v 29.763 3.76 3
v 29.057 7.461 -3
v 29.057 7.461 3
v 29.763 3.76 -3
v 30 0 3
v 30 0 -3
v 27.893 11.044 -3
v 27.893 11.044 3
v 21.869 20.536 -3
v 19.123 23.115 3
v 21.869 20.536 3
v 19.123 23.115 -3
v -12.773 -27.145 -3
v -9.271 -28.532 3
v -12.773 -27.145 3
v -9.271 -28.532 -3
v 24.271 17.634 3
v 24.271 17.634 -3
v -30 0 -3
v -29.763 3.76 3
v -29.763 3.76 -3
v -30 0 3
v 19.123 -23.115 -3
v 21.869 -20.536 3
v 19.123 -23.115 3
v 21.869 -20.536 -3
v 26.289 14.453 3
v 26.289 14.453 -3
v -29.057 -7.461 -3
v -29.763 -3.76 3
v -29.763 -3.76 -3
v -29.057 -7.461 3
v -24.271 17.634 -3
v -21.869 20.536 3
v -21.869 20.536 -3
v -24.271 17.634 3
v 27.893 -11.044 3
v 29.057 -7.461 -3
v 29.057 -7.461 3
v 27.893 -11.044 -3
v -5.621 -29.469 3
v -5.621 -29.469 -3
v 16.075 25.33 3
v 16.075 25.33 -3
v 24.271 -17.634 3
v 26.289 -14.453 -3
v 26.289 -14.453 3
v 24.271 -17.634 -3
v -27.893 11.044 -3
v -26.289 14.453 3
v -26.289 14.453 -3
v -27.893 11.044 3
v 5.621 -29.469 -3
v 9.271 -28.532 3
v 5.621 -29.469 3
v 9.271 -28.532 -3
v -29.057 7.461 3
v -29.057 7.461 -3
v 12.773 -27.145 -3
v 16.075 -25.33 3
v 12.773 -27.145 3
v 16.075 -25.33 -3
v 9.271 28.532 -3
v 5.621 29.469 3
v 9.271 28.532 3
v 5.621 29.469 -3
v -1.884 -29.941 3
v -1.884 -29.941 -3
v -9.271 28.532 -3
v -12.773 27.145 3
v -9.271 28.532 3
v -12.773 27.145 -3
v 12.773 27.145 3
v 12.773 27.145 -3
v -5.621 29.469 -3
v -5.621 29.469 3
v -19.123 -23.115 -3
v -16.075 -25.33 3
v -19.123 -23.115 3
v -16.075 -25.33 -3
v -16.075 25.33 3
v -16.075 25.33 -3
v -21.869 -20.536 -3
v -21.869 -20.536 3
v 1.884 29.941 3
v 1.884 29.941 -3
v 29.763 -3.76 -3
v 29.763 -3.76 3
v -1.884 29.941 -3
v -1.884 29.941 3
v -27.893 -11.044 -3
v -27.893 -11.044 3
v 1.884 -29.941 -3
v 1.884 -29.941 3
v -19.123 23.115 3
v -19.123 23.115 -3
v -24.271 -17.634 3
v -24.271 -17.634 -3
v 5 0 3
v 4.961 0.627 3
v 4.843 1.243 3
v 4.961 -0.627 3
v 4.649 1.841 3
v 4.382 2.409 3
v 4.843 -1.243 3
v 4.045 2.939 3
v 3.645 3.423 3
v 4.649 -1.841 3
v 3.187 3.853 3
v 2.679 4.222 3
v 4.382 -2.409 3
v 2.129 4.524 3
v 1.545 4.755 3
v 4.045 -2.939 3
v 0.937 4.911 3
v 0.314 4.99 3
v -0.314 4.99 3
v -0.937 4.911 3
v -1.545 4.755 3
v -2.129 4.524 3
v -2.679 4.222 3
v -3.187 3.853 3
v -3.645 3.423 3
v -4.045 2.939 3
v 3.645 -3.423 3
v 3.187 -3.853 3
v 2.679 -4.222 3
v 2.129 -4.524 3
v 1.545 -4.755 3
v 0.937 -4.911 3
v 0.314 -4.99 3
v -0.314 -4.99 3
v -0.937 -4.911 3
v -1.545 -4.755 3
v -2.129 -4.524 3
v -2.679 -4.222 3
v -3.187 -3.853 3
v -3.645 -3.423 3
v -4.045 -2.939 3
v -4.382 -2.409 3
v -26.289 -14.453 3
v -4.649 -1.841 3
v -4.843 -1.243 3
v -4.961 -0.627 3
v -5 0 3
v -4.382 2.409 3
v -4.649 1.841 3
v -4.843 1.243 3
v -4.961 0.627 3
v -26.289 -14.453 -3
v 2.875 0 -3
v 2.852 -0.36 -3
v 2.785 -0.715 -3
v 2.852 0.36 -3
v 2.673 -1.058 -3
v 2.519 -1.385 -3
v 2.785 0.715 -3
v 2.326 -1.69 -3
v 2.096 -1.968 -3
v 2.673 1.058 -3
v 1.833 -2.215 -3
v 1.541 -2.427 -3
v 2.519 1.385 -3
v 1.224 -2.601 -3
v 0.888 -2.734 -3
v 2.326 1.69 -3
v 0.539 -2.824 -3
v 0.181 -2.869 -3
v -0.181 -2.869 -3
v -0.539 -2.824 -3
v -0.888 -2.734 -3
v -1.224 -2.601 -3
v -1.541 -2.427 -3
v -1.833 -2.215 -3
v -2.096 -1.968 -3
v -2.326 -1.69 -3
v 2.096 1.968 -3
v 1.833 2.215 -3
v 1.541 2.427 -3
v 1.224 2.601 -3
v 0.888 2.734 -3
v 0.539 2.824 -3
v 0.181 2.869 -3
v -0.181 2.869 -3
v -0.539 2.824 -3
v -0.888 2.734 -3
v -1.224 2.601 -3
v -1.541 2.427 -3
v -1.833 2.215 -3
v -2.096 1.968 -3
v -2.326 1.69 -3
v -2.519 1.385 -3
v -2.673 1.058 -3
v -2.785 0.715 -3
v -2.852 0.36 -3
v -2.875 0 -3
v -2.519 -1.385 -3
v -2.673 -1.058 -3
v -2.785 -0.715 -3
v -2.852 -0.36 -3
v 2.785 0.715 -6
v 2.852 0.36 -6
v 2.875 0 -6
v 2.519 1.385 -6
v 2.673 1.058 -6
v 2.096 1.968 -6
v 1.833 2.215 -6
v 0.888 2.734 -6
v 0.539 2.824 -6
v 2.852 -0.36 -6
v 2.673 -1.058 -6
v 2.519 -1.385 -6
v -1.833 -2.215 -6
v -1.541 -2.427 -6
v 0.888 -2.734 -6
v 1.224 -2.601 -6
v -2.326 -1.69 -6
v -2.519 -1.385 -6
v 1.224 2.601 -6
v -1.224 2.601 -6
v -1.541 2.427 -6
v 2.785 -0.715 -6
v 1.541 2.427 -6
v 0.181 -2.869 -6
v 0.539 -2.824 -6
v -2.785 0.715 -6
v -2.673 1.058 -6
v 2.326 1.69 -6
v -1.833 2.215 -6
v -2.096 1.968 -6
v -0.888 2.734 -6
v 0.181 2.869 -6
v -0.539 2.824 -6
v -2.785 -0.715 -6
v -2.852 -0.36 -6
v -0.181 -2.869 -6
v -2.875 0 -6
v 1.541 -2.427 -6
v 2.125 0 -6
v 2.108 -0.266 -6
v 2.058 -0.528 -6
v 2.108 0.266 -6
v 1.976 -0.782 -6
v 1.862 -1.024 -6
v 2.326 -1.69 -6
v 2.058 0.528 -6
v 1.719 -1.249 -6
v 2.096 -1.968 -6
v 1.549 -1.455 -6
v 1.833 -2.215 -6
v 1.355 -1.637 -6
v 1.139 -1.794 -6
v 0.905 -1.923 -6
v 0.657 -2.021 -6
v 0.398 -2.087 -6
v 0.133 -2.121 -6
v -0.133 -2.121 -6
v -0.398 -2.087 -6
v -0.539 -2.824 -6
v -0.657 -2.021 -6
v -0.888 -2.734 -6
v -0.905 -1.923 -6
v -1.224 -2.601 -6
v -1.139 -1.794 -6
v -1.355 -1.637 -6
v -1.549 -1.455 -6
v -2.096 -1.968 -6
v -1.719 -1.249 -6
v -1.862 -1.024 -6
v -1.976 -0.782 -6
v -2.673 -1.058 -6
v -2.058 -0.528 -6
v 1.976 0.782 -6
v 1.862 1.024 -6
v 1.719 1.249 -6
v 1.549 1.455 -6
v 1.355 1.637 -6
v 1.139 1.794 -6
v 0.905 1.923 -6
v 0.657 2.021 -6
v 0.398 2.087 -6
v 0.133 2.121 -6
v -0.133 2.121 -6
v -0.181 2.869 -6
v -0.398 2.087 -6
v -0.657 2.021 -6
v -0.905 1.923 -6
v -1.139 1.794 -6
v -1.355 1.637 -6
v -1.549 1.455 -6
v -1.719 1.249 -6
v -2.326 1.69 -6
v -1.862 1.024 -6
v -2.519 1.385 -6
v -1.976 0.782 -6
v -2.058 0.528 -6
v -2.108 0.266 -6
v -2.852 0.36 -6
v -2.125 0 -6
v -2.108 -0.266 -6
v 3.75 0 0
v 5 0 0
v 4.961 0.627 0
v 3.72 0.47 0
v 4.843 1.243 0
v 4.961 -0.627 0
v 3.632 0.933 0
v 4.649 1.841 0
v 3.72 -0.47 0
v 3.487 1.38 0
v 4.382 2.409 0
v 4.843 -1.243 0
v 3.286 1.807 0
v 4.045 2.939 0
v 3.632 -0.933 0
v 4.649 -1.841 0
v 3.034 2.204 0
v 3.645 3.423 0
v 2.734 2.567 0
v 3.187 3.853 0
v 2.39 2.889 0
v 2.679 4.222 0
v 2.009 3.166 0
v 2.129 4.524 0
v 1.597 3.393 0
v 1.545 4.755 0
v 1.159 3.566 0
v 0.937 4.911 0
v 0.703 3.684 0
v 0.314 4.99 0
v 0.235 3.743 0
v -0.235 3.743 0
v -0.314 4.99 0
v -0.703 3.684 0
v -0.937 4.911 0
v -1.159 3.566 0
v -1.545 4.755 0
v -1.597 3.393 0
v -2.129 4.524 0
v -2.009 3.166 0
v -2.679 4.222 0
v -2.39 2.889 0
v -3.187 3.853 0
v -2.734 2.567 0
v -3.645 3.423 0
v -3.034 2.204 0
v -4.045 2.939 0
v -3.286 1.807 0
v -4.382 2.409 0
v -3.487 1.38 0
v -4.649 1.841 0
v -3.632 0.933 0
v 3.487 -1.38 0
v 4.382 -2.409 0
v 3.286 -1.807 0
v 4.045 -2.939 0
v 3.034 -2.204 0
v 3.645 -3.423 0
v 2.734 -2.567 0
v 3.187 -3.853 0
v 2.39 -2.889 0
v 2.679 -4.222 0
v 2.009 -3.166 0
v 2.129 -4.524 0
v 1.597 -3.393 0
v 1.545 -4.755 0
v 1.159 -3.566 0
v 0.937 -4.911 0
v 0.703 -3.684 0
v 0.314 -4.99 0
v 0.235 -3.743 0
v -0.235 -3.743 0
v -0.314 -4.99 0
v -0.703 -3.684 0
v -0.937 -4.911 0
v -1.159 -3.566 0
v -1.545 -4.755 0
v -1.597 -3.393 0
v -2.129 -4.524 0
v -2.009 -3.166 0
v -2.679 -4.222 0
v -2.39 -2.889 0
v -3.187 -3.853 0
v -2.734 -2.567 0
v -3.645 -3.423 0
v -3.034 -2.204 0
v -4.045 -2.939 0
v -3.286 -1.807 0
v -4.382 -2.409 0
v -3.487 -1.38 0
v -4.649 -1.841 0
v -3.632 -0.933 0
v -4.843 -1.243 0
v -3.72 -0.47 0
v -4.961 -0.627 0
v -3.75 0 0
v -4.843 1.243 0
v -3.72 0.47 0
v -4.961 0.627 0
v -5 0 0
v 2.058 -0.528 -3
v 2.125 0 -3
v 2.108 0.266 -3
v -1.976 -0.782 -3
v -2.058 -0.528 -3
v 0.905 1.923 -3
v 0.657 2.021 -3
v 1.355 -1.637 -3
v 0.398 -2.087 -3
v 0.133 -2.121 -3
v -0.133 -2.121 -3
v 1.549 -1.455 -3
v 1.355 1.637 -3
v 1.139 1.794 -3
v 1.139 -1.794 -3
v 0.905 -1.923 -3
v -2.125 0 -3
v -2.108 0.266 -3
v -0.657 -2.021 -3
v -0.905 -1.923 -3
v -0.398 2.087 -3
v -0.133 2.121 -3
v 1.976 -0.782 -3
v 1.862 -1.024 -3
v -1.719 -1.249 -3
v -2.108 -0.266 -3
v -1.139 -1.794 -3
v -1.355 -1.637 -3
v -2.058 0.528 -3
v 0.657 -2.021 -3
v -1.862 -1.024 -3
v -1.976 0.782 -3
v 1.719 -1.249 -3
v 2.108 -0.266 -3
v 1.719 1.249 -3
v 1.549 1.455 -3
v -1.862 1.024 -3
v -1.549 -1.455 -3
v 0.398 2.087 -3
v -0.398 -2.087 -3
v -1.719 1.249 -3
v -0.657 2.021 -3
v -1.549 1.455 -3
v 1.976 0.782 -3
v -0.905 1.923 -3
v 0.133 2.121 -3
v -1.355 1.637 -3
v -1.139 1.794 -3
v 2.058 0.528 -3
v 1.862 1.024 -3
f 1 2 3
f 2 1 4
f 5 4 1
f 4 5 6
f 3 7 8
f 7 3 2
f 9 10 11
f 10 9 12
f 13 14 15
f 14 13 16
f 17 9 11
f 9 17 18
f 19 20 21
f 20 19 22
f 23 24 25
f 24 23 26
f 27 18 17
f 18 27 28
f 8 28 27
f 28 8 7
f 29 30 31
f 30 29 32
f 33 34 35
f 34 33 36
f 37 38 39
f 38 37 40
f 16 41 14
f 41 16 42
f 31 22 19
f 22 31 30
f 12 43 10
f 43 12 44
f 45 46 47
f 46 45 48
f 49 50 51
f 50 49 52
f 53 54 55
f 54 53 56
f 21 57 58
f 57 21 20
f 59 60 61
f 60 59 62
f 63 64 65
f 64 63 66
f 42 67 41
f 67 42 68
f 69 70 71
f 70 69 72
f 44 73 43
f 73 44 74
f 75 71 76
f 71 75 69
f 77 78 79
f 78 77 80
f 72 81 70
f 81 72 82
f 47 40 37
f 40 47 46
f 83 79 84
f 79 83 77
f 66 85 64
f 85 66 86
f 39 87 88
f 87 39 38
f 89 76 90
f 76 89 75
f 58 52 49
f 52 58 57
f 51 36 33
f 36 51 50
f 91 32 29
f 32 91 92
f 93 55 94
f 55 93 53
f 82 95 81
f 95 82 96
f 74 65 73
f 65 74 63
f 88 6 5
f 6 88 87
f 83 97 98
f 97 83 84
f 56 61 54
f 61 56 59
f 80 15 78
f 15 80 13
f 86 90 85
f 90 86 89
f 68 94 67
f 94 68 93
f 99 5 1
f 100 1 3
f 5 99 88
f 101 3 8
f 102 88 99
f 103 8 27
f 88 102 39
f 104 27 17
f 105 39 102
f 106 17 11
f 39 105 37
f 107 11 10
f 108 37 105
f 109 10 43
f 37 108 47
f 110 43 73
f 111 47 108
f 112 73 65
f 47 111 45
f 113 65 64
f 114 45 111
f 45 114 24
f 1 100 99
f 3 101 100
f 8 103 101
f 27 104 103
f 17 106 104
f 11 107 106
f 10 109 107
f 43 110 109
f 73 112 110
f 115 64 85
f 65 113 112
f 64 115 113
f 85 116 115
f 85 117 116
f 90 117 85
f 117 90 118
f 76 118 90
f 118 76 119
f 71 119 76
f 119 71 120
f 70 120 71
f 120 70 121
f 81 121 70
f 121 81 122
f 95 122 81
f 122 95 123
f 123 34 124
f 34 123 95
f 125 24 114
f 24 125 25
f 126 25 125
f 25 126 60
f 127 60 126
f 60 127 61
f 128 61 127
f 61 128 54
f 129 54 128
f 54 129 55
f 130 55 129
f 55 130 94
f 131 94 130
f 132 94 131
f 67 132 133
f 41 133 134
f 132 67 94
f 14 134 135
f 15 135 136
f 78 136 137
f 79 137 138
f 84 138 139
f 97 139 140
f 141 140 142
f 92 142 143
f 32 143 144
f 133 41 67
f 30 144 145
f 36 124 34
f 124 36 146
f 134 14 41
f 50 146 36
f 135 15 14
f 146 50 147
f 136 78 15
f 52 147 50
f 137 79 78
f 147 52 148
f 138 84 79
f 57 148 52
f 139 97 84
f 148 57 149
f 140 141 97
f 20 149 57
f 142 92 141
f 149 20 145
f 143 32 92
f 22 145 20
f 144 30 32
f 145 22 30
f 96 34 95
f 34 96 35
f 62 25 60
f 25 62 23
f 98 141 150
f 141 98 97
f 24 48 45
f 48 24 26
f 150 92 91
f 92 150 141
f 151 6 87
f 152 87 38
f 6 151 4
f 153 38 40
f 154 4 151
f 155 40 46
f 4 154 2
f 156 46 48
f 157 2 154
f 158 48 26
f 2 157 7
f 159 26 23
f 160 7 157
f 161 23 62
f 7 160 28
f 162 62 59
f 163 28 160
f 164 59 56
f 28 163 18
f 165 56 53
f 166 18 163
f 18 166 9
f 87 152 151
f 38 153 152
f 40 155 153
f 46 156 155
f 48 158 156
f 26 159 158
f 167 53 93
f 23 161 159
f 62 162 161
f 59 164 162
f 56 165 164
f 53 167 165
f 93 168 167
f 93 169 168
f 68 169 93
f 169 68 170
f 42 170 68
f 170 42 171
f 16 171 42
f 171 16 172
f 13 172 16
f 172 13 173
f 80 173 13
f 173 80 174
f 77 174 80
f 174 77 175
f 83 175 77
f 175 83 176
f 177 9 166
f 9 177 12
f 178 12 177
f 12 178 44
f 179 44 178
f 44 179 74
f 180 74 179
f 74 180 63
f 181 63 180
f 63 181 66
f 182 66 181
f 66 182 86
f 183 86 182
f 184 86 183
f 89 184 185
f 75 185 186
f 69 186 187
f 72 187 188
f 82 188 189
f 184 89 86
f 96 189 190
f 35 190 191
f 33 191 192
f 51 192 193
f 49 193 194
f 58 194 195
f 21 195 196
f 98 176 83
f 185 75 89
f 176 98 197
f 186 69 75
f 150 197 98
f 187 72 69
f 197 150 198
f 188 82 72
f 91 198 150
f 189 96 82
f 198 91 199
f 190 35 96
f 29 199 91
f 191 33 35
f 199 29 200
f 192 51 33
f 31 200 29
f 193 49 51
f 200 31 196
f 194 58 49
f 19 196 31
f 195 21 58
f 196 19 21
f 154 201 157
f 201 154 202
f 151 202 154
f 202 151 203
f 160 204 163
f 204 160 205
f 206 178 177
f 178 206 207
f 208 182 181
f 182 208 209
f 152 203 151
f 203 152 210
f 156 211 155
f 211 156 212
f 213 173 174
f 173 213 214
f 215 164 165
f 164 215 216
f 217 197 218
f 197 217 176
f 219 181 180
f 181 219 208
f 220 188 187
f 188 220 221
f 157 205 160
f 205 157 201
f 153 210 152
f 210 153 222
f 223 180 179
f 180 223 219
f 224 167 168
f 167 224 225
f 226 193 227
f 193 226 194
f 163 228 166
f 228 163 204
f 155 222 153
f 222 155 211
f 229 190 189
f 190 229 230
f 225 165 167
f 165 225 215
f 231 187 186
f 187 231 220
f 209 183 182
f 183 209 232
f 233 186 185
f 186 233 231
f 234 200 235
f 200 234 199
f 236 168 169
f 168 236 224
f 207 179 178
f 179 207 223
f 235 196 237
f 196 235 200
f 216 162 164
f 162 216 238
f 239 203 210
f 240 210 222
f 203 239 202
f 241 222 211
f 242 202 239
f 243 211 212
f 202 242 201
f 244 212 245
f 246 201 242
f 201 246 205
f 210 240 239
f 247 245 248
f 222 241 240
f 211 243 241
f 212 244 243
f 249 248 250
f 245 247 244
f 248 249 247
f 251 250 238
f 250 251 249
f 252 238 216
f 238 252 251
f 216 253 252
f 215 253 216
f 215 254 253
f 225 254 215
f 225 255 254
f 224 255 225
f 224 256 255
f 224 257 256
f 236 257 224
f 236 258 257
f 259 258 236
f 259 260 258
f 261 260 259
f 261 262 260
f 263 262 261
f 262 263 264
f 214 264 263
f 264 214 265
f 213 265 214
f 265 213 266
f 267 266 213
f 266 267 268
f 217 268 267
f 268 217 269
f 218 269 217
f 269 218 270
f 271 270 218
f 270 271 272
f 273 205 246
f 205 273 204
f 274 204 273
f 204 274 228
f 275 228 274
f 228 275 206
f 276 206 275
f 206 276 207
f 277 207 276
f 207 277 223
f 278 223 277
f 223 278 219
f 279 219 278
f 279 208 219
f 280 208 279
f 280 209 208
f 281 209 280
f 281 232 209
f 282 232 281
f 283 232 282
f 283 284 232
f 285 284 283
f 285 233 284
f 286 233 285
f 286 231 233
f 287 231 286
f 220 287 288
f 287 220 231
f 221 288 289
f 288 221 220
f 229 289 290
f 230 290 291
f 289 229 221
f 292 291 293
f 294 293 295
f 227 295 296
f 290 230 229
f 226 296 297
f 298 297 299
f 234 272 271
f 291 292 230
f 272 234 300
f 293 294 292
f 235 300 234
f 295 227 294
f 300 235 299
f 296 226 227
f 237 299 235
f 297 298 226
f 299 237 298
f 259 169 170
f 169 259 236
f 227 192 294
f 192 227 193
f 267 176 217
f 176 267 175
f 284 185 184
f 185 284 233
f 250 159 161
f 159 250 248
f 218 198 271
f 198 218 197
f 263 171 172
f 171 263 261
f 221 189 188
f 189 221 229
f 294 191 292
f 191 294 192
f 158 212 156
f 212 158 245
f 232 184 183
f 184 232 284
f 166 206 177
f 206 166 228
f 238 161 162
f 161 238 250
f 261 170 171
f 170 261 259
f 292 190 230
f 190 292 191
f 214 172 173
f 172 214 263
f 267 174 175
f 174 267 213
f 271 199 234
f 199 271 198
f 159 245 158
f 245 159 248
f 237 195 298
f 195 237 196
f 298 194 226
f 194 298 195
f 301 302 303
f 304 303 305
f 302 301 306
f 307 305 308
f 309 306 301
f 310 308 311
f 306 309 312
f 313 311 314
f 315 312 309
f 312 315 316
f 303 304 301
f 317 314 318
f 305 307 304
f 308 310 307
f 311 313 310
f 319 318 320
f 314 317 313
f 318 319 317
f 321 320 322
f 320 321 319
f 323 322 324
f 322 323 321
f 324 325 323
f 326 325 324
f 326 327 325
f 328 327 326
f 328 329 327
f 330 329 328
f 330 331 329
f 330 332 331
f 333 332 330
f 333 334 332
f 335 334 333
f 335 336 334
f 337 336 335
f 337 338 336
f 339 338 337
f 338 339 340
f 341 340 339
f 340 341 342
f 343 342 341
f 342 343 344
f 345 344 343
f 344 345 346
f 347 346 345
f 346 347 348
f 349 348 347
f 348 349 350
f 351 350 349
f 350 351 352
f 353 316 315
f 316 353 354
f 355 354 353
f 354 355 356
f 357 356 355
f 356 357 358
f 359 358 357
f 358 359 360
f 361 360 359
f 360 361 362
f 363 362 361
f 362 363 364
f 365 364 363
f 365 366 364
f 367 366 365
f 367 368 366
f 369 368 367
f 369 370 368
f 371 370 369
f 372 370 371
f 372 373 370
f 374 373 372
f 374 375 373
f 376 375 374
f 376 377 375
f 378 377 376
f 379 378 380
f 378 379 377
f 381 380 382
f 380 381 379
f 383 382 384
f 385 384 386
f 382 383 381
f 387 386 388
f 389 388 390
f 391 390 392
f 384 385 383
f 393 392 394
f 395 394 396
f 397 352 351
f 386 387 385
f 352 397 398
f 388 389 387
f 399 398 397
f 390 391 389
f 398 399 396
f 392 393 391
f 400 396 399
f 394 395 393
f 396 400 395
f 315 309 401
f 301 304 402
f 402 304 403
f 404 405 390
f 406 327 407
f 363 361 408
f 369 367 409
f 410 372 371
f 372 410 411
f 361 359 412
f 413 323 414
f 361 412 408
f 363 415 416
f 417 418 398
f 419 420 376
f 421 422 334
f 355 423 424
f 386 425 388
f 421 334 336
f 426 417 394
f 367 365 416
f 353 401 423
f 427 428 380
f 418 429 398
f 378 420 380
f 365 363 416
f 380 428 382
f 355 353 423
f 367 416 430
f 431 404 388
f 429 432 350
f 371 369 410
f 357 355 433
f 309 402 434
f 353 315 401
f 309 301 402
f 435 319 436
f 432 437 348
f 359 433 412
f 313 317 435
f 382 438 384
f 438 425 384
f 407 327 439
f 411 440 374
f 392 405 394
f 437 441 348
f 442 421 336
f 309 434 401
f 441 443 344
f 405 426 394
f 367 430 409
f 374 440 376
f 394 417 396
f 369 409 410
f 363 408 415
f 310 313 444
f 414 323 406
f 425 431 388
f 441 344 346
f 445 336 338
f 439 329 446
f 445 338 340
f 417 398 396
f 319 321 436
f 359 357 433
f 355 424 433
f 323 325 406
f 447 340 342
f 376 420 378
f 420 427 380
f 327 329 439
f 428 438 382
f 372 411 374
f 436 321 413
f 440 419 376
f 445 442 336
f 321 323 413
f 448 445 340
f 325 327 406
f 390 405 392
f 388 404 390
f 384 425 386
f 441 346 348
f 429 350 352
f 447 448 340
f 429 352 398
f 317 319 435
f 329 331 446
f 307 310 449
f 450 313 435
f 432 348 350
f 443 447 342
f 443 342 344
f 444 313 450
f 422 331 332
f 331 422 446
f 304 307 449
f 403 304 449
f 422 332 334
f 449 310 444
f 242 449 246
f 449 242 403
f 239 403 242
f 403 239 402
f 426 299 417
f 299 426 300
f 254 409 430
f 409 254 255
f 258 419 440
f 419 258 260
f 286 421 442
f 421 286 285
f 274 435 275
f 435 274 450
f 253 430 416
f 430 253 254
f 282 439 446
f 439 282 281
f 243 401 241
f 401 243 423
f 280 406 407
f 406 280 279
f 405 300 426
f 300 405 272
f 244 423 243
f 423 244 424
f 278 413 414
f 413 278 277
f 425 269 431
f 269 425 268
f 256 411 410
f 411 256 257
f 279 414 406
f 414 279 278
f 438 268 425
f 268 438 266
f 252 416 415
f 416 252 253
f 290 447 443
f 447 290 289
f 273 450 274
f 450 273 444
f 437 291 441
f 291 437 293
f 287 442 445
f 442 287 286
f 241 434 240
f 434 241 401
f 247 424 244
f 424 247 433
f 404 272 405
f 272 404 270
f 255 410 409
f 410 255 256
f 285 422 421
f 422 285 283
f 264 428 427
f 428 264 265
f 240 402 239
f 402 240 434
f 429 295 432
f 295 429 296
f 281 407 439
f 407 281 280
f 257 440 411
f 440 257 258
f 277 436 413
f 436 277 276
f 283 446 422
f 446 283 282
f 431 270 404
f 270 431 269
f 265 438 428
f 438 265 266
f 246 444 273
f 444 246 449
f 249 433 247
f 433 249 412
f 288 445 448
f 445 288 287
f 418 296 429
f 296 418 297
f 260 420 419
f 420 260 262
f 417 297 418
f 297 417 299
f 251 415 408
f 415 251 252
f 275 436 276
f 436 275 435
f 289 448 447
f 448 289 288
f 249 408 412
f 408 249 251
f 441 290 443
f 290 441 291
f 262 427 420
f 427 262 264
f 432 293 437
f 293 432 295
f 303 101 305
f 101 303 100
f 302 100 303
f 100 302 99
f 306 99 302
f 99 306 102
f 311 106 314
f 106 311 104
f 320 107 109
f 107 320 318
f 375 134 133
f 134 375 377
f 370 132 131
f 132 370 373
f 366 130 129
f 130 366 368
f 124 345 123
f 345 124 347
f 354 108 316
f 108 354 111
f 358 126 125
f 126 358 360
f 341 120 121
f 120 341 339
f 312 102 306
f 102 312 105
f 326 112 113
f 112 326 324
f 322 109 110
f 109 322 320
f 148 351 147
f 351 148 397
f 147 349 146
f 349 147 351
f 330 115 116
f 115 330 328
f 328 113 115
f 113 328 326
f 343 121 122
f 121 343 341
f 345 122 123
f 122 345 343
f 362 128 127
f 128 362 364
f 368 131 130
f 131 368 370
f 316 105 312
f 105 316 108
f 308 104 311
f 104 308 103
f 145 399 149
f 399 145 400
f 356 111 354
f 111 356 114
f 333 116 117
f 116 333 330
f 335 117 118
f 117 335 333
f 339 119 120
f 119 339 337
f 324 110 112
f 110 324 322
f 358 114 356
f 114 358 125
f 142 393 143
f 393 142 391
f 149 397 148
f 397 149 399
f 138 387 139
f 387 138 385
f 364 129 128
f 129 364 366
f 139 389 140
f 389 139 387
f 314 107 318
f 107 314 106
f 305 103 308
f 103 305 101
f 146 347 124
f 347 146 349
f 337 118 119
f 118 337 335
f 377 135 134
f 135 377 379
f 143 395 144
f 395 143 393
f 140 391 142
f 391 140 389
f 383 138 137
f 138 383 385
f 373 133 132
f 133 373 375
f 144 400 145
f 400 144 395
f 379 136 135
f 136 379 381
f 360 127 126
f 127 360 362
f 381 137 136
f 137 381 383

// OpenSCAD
$fn = 50;

difference() {
	union() {
		translate(v = [0, 0, -3.0]) {
			cylinder(h = 6, r = 30.0);
		}
		#translate(v = [0, 0, -6.0]) {
			cylinder(h = 6, r = 2.875);
		}
	}
	union() {
		translate(v = [0, 0, 0]) {
			rotate(a = [0, 0, 0]) {
				difference() {
					union() {
						translate(v = [0, 0, -6.0]) {
							cylinder(h = 6, r = 2.0);
						}
						translate(v = [0, 0, -3]) {
							cylinder(h = 3, r1 = 2.125, r2 = 3.75);
						}
						translate(v = [0, 0, -6.0]) {
							cylinder(h = 6, r = 2.125);
						}
						translate(v = [0, 0, -6.0]) {
							cylinder(h = 6, r = 2.0);
						}
					}
					union();
				}
			}
		}
		#cylinder(h = 3, r = 5.0);
	}
}
